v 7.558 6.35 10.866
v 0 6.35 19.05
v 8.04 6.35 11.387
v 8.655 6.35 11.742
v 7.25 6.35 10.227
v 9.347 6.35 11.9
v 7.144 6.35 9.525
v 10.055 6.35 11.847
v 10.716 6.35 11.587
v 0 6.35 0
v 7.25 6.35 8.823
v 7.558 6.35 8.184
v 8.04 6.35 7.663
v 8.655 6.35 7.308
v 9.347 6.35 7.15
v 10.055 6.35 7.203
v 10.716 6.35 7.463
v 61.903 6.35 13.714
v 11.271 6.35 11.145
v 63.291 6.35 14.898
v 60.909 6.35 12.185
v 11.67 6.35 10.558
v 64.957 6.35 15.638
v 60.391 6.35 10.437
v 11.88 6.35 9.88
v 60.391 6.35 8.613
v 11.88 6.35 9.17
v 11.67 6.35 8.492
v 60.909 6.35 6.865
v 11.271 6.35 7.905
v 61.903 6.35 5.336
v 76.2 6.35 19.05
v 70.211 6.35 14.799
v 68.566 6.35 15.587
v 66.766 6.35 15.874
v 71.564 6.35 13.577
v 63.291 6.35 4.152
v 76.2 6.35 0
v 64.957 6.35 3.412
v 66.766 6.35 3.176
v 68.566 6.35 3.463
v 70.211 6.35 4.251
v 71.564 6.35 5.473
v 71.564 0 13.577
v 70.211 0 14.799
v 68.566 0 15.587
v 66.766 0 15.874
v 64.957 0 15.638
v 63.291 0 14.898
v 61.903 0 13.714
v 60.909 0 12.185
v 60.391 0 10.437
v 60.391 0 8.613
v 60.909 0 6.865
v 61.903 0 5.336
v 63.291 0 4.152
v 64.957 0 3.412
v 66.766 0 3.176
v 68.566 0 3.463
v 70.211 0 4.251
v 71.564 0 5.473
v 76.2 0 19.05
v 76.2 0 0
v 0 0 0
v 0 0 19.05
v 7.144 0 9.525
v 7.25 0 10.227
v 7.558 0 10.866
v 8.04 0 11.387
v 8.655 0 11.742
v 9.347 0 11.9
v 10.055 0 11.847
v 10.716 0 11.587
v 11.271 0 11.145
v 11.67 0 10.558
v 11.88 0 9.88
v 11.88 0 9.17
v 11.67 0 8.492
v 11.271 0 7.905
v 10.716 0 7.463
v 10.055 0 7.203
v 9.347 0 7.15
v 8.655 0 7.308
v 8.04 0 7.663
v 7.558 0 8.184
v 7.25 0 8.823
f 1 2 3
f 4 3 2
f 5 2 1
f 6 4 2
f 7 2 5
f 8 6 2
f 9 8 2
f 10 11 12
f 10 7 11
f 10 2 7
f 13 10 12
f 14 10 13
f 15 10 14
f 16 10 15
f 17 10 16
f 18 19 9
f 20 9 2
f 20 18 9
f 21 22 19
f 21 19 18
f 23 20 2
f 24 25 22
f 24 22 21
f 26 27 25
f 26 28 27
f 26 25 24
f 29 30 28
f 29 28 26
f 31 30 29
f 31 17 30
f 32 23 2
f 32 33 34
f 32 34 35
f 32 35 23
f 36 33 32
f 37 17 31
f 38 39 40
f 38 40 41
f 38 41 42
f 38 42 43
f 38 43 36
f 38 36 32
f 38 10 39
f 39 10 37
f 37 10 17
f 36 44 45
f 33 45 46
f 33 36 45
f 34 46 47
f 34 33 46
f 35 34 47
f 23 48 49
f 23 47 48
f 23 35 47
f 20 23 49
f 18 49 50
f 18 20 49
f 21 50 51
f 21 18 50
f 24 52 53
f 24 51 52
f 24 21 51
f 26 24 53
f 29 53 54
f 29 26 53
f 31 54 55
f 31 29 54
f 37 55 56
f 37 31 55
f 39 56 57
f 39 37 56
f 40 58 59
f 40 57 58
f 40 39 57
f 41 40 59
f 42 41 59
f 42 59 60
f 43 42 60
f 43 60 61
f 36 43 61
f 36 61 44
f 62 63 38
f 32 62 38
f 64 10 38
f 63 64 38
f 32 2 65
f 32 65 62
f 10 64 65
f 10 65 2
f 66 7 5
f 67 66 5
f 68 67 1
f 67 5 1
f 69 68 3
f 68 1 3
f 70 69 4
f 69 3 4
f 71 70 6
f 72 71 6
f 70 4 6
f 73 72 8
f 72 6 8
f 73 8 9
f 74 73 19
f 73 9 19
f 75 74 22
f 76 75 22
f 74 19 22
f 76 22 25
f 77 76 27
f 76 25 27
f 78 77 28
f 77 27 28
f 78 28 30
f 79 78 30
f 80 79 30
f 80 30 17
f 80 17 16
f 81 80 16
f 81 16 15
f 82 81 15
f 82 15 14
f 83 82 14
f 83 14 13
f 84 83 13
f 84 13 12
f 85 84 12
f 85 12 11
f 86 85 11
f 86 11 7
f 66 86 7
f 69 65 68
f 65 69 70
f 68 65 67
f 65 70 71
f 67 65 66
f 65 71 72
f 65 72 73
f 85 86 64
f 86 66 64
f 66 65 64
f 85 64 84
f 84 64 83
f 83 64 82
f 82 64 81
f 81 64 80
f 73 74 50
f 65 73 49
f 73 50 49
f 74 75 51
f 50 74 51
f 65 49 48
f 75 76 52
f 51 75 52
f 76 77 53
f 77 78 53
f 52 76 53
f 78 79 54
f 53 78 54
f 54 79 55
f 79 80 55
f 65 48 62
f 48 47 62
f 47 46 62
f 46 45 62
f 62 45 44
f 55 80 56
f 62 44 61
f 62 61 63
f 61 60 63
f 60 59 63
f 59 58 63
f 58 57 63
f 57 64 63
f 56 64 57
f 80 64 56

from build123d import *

# Parameters (mm, degrees)
SKETCH1_W          = 76.2
SKETCH1_H          = 6.35
BASE_EXTRUDE_DEPTH = 19.05
CUT_EXTRUDE1_DEPTH = 7.35
SKETCH3_R          = 2.38125
CUT_EXTRUDE2_DEPTH = 7.35


with BuildPart() as part:
    # Sketch1 → Base-Extrude (new body)
    with BuildSketch(Plane.XY):
        with Locations((38.1, 3.175)):
            Rectangle(SKETCH1_W, SKETCH1_H)
    extrude(amount=BASE_EXTRUDE_DEPTH)

    # Sketch2 → Cut-Extrude1 (cut, through all)
    with BuildSketch(Plane(origin=(0, 6.35, 0), x_dir=(-1, 0, 0), z_dir=(0, 1, 0))):
        with BuildLine():
            Line((-71.5645, 5.473421326), (-71.5645, 13.576578674))
            ThreePointArc((-71.5645, 13.576578674), (-60.325, 9.525), (-71.5645, 5.473421326))
        make_face()
    extrude(amount=-CUT_EXTRUDE1_DEPTH, mode=Mode.SUBTRACT)

    # Sketch3 → Cut-Extrude2 (cut, through all)
    with BuildSketch(Plane(origin=(0, 6.35, 0), x_dir=(-1, 0, 0), z_dir=(0, 1, 0))):
        with Locations((-9.525, 9.525)):
            Circle(SKETCH3_R)
    extrude(amount=-CUT_EXTRUDE2_DEPTH, mode=Mode.SUBTRACT)


solid = part.part
